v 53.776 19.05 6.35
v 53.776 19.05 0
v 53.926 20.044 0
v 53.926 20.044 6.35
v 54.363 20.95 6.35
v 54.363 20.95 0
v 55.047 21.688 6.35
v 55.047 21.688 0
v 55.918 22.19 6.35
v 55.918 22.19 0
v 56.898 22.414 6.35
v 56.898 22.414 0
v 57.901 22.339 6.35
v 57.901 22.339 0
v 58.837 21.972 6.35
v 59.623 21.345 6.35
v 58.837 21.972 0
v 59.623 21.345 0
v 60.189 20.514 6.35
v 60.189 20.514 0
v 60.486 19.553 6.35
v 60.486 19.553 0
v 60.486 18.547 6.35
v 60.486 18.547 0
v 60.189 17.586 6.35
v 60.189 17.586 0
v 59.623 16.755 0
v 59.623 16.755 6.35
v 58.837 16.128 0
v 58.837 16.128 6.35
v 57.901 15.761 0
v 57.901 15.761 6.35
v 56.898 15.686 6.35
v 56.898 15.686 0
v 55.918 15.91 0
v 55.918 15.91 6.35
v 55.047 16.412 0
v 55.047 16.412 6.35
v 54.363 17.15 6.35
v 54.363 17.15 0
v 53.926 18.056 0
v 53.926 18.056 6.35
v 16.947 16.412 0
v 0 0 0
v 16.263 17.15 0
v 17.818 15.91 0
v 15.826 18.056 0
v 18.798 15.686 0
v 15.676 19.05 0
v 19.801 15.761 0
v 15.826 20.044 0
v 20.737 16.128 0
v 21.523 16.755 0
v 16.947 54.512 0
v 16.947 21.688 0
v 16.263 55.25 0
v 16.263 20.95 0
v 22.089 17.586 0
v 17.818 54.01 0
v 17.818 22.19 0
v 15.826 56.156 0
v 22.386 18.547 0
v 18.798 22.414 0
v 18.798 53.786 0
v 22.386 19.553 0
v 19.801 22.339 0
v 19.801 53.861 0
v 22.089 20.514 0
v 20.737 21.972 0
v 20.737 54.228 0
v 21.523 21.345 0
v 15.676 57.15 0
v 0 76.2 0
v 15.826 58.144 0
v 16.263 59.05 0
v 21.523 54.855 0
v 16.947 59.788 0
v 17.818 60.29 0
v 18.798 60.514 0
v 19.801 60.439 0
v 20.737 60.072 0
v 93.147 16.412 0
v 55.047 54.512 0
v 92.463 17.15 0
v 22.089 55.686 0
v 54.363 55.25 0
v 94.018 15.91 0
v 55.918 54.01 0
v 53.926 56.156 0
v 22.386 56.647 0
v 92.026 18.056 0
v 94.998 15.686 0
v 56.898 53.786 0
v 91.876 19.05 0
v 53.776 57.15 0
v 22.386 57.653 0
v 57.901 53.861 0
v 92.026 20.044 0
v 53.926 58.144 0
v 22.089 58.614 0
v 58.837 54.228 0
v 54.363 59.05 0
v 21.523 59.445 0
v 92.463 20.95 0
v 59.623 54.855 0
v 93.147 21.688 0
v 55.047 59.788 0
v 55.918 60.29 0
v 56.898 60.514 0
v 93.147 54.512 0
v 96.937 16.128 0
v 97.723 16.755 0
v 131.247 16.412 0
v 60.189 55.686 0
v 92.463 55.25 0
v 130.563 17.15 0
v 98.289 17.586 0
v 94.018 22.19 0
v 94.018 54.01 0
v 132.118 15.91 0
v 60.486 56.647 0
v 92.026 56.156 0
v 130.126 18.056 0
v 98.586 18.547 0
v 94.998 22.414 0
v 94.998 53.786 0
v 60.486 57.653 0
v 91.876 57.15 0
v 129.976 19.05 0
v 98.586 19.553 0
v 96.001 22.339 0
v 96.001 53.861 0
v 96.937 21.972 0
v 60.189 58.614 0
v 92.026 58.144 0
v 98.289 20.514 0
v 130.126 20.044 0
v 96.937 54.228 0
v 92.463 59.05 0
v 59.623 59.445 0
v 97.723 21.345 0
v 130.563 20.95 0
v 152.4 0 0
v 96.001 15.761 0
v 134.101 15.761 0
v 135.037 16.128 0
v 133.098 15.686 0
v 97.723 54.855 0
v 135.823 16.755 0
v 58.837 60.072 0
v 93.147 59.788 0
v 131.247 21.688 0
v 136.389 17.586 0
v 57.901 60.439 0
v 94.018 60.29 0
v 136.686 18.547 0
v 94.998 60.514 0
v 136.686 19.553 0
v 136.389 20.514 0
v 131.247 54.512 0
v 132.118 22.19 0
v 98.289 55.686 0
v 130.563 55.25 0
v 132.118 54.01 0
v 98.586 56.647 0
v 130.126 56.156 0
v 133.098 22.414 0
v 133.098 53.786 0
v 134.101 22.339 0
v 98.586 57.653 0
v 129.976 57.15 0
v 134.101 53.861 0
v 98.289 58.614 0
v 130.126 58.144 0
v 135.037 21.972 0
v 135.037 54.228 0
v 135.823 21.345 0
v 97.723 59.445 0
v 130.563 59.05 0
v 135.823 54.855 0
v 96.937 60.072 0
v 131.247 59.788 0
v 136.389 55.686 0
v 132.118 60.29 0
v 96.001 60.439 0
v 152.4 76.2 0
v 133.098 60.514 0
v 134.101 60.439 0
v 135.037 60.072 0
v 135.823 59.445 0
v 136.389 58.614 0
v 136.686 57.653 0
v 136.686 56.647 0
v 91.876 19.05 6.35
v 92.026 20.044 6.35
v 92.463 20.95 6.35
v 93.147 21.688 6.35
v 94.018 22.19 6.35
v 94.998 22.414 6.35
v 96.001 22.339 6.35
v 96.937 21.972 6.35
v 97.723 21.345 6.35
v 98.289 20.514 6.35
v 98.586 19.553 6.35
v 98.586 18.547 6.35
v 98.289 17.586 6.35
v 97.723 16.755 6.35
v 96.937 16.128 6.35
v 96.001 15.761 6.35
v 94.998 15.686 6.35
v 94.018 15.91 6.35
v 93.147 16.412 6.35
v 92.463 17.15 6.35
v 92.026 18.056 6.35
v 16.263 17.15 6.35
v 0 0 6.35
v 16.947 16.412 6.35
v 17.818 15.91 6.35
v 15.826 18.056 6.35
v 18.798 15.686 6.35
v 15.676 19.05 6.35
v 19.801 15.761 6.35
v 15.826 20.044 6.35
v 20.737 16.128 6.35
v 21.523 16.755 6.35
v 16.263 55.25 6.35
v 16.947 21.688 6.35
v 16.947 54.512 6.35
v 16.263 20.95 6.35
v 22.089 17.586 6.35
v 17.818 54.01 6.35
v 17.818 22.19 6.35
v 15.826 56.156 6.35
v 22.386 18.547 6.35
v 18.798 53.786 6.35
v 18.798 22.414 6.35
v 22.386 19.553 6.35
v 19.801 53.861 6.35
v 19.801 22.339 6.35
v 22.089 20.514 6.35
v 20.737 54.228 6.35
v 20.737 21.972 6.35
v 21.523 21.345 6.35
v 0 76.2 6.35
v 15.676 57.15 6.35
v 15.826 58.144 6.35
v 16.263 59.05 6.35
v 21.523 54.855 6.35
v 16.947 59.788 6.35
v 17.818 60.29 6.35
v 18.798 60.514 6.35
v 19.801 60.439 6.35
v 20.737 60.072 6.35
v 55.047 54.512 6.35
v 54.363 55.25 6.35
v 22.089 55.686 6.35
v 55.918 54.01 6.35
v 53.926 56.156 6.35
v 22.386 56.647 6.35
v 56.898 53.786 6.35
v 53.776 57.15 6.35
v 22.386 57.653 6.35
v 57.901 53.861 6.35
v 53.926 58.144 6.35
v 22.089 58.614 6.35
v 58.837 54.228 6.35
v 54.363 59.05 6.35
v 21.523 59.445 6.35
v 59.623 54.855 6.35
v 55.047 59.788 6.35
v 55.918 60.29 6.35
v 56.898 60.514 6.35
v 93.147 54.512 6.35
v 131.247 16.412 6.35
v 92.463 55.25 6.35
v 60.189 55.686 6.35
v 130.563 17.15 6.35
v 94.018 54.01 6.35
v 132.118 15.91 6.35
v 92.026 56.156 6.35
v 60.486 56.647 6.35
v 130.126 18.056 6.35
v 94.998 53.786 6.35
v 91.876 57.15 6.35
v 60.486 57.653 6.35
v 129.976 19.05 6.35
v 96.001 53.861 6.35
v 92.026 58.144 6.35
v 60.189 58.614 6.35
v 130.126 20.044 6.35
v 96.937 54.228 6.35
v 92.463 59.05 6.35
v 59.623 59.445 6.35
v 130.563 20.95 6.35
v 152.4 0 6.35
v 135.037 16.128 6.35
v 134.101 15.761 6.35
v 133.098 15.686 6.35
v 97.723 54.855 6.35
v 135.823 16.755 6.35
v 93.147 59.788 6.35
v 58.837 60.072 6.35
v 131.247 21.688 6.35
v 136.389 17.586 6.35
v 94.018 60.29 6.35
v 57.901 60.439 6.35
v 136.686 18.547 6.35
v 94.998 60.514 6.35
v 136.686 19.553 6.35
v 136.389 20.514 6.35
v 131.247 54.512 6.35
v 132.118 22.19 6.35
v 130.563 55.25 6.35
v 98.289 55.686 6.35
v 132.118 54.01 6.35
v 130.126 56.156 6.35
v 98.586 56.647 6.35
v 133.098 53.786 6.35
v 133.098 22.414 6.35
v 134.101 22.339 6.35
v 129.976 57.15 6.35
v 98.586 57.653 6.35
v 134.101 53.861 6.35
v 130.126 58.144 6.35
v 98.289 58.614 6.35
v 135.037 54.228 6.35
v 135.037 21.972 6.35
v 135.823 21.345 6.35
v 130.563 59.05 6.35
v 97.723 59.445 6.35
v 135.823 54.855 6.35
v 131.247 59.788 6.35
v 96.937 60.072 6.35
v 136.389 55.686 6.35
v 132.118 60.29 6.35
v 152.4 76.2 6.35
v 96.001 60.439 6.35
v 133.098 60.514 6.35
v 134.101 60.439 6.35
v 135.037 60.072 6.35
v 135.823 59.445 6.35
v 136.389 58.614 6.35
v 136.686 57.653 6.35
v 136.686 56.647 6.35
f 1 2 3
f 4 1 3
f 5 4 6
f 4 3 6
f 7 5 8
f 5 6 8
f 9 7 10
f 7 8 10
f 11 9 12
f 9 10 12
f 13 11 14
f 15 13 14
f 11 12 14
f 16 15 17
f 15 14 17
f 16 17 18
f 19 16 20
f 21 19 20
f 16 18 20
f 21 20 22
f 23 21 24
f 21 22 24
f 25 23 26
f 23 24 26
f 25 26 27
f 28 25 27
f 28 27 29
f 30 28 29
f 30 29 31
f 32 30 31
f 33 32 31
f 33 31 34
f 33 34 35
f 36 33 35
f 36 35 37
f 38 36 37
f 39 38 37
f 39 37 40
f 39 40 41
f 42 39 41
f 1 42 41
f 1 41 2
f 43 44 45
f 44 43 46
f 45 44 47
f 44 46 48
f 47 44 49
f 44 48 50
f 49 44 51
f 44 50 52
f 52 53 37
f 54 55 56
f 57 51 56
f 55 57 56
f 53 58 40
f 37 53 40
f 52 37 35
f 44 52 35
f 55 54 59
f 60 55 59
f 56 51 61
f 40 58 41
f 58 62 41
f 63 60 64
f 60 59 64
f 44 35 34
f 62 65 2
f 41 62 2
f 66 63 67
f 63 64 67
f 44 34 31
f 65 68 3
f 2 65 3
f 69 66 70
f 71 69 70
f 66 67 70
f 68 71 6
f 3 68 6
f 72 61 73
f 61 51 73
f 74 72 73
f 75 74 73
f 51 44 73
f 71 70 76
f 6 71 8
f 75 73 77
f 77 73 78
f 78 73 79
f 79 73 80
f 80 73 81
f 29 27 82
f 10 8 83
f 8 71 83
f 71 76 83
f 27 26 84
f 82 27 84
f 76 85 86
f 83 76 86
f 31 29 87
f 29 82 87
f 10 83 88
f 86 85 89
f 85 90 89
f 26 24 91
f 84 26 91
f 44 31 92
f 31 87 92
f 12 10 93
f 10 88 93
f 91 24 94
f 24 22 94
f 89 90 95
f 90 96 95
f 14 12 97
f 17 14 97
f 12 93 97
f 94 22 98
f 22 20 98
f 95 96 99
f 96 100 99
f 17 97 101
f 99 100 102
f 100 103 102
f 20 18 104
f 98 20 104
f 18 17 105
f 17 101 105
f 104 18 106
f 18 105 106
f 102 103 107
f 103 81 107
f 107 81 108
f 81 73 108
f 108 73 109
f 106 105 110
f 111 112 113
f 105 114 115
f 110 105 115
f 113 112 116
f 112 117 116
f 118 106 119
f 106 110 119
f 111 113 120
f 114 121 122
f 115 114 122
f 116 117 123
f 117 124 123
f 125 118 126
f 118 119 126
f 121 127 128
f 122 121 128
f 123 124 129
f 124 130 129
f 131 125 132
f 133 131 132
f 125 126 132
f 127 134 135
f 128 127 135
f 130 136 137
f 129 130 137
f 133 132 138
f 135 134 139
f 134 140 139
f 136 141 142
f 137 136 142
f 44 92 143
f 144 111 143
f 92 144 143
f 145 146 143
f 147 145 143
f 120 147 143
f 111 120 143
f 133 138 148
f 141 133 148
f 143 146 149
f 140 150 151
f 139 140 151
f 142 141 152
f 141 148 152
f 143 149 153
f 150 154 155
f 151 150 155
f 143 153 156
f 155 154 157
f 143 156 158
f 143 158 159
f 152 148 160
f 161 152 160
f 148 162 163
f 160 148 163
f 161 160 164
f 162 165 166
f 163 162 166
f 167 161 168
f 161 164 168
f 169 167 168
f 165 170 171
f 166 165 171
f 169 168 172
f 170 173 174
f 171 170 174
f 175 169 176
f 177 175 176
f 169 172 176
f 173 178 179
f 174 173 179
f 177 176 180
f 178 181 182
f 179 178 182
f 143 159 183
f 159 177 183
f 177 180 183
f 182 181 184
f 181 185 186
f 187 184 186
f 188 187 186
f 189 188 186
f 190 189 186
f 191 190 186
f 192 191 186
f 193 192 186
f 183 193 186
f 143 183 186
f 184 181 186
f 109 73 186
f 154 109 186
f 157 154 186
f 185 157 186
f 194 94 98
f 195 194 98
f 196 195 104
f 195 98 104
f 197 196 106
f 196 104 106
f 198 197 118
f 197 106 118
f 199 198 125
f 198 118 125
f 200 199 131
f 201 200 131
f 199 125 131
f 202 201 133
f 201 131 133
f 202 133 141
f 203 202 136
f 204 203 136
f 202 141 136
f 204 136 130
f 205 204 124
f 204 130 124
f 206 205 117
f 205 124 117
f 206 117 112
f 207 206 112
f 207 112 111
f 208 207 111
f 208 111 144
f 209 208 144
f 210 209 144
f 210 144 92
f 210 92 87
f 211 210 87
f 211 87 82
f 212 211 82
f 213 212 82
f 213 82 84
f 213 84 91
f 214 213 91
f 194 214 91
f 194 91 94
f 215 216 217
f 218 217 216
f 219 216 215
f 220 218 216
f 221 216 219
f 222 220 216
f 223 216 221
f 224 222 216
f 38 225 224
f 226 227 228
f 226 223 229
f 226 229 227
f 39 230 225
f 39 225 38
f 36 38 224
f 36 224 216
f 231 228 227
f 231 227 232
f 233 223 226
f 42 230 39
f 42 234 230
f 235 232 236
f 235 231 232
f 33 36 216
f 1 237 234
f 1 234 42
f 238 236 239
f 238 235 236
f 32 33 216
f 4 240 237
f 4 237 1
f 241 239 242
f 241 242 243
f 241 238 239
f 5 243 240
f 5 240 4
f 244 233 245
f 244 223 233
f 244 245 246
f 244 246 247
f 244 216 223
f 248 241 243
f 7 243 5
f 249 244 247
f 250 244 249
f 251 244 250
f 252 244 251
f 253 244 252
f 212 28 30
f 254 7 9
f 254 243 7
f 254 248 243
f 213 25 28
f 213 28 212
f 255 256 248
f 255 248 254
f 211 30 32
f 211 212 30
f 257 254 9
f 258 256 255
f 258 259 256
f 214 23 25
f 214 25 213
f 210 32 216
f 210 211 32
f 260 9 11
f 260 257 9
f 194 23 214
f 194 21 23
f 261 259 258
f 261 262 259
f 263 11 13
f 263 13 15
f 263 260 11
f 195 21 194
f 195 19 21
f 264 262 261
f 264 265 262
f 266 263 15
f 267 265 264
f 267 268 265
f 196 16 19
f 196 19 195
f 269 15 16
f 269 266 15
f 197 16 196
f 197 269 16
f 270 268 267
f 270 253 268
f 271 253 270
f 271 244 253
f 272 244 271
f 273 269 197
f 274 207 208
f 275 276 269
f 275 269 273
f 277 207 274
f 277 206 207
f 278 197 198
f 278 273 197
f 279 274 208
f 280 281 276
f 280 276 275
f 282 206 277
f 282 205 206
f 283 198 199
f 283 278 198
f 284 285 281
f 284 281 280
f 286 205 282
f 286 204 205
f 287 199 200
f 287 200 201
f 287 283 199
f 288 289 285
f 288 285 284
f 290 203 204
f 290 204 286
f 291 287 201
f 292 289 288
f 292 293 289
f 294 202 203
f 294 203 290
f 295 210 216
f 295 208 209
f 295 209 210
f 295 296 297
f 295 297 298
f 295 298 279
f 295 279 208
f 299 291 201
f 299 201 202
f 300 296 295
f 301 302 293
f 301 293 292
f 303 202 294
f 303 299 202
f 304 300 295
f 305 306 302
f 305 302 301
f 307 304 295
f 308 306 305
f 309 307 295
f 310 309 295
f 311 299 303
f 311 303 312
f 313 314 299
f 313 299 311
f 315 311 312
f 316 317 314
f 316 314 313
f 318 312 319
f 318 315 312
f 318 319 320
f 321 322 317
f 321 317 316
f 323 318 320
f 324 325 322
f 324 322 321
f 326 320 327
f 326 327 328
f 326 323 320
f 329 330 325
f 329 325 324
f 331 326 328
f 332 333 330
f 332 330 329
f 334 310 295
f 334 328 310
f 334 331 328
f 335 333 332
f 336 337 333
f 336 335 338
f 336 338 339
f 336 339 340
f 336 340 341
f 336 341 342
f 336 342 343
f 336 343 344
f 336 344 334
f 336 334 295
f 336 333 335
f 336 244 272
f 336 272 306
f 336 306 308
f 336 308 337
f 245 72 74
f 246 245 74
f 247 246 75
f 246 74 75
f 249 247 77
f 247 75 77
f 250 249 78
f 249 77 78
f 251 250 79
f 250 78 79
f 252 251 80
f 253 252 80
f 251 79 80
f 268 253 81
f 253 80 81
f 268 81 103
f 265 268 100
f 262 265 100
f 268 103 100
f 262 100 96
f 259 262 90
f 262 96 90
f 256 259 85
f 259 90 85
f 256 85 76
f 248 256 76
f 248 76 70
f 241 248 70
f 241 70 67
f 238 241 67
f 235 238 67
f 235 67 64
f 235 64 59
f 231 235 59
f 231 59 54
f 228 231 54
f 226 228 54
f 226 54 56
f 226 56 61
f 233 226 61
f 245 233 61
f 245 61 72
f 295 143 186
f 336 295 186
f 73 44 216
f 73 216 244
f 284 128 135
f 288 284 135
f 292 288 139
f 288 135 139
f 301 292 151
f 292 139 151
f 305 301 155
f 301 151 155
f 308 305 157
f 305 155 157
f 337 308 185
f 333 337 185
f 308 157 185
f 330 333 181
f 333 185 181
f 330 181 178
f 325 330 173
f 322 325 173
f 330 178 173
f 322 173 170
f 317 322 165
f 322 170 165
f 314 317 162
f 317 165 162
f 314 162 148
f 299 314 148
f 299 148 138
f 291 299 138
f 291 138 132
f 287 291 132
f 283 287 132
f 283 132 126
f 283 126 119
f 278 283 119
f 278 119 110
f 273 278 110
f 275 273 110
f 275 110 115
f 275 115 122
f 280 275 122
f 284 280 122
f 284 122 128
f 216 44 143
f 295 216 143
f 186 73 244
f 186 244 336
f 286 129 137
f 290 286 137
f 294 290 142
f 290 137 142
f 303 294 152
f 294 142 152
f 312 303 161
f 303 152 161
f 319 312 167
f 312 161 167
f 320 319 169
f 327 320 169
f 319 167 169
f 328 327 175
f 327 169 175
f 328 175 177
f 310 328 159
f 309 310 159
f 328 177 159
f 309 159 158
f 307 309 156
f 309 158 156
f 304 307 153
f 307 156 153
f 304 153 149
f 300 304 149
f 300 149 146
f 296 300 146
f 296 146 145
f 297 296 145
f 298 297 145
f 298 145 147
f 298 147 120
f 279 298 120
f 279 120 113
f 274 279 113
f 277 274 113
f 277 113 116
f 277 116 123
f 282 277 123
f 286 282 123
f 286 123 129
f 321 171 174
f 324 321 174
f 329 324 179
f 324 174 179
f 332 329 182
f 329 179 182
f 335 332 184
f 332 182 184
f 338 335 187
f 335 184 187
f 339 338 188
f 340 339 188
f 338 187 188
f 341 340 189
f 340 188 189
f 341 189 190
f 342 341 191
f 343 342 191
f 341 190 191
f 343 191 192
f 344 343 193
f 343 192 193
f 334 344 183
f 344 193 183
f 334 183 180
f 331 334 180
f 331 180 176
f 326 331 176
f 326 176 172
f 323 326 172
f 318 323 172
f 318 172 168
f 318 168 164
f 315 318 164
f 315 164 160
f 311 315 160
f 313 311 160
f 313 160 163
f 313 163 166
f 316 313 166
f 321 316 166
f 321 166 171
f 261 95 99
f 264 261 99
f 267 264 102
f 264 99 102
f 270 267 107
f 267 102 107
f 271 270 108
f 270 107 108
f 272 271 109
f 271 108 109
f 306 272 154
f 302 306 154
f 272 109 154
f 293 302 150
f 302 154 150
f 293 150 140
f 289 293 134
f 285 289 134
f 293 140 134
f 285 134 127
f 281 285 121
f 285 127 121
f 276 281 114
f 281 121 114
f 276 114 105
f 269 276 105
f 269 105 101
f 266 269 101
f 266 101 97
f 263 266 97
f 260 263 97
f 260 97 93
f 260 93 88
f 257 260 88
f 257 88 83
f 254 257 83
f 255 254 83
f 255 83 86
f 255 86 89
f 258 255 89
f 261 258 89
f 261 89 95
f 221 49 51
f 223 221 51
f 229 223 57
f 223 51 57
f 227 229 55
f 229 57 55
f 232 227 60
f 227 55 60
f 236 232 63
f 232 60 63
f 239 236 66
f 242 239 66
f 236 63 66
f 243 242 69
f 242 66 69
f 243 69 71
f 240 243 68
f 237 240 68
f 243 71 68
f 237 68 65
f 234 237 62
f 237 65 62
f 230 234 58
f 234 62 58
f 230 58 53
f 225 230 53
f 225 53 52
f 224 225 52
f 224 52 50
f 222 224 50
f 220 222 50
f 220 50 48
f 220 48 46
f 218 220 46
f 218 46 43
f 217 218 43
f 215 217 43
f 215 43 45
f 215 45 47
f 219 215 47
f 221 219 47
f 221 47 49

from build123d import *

# Parameters (mm, degrees)
SKETCH1_W                        = 152.4
SKETCH1_H                        = 76.2
BOSS_EXTRUDE1_DEPTH              = 6.35
F_17_64_0_26563_DIAMETER_HOLE1_D = 6.747002
LPATTERN1_COUNT                  = 4
LPATTERN1_PITCH                  = 38.1
LPATTERN1_COUNT_DIR2             = 2
LPATTERN1_PITCH_DIR2             = 38.1


with BuildPart() as part:
    # Sketch1 → Boss-Extrude1 (new body)
    with BuildSketch(Plane.XY):
        with Locations((76.2, 38.1)):
            Rectangle(SKETCH1_W, SKETCH1_H)
    extrude(amount=BOSS_EXTRUDE1_DEPTH)

    # 17/64 (0.26563) Diameter Hole1 (through all)
    with Locations(Plane.XY.offset(6.35)):
        with Locations((19.05, 19.05)):
            f_17_64_0_26563_diameter_hole1 = Hole(F_17_64_0_26563_DIAMETER_HOLE1_D / 2)

    # LPattern1: 17_64 _0.26563_ Diameter Hole1 4 × 2
    with Locations(*[(i * LPATTERN1_PITCH, j * LPATTERN1_PITCH_DIR2, 0) for i in range(LPATTERN1_COUNT) for j in range(LPATTERN1_COUNT_DIR2) if (i, j) != (0, 0)]):
        add(f_17_64_0_26563_diameter_hole1, mode=Mode.SUBTRACT)


solid = part.part
